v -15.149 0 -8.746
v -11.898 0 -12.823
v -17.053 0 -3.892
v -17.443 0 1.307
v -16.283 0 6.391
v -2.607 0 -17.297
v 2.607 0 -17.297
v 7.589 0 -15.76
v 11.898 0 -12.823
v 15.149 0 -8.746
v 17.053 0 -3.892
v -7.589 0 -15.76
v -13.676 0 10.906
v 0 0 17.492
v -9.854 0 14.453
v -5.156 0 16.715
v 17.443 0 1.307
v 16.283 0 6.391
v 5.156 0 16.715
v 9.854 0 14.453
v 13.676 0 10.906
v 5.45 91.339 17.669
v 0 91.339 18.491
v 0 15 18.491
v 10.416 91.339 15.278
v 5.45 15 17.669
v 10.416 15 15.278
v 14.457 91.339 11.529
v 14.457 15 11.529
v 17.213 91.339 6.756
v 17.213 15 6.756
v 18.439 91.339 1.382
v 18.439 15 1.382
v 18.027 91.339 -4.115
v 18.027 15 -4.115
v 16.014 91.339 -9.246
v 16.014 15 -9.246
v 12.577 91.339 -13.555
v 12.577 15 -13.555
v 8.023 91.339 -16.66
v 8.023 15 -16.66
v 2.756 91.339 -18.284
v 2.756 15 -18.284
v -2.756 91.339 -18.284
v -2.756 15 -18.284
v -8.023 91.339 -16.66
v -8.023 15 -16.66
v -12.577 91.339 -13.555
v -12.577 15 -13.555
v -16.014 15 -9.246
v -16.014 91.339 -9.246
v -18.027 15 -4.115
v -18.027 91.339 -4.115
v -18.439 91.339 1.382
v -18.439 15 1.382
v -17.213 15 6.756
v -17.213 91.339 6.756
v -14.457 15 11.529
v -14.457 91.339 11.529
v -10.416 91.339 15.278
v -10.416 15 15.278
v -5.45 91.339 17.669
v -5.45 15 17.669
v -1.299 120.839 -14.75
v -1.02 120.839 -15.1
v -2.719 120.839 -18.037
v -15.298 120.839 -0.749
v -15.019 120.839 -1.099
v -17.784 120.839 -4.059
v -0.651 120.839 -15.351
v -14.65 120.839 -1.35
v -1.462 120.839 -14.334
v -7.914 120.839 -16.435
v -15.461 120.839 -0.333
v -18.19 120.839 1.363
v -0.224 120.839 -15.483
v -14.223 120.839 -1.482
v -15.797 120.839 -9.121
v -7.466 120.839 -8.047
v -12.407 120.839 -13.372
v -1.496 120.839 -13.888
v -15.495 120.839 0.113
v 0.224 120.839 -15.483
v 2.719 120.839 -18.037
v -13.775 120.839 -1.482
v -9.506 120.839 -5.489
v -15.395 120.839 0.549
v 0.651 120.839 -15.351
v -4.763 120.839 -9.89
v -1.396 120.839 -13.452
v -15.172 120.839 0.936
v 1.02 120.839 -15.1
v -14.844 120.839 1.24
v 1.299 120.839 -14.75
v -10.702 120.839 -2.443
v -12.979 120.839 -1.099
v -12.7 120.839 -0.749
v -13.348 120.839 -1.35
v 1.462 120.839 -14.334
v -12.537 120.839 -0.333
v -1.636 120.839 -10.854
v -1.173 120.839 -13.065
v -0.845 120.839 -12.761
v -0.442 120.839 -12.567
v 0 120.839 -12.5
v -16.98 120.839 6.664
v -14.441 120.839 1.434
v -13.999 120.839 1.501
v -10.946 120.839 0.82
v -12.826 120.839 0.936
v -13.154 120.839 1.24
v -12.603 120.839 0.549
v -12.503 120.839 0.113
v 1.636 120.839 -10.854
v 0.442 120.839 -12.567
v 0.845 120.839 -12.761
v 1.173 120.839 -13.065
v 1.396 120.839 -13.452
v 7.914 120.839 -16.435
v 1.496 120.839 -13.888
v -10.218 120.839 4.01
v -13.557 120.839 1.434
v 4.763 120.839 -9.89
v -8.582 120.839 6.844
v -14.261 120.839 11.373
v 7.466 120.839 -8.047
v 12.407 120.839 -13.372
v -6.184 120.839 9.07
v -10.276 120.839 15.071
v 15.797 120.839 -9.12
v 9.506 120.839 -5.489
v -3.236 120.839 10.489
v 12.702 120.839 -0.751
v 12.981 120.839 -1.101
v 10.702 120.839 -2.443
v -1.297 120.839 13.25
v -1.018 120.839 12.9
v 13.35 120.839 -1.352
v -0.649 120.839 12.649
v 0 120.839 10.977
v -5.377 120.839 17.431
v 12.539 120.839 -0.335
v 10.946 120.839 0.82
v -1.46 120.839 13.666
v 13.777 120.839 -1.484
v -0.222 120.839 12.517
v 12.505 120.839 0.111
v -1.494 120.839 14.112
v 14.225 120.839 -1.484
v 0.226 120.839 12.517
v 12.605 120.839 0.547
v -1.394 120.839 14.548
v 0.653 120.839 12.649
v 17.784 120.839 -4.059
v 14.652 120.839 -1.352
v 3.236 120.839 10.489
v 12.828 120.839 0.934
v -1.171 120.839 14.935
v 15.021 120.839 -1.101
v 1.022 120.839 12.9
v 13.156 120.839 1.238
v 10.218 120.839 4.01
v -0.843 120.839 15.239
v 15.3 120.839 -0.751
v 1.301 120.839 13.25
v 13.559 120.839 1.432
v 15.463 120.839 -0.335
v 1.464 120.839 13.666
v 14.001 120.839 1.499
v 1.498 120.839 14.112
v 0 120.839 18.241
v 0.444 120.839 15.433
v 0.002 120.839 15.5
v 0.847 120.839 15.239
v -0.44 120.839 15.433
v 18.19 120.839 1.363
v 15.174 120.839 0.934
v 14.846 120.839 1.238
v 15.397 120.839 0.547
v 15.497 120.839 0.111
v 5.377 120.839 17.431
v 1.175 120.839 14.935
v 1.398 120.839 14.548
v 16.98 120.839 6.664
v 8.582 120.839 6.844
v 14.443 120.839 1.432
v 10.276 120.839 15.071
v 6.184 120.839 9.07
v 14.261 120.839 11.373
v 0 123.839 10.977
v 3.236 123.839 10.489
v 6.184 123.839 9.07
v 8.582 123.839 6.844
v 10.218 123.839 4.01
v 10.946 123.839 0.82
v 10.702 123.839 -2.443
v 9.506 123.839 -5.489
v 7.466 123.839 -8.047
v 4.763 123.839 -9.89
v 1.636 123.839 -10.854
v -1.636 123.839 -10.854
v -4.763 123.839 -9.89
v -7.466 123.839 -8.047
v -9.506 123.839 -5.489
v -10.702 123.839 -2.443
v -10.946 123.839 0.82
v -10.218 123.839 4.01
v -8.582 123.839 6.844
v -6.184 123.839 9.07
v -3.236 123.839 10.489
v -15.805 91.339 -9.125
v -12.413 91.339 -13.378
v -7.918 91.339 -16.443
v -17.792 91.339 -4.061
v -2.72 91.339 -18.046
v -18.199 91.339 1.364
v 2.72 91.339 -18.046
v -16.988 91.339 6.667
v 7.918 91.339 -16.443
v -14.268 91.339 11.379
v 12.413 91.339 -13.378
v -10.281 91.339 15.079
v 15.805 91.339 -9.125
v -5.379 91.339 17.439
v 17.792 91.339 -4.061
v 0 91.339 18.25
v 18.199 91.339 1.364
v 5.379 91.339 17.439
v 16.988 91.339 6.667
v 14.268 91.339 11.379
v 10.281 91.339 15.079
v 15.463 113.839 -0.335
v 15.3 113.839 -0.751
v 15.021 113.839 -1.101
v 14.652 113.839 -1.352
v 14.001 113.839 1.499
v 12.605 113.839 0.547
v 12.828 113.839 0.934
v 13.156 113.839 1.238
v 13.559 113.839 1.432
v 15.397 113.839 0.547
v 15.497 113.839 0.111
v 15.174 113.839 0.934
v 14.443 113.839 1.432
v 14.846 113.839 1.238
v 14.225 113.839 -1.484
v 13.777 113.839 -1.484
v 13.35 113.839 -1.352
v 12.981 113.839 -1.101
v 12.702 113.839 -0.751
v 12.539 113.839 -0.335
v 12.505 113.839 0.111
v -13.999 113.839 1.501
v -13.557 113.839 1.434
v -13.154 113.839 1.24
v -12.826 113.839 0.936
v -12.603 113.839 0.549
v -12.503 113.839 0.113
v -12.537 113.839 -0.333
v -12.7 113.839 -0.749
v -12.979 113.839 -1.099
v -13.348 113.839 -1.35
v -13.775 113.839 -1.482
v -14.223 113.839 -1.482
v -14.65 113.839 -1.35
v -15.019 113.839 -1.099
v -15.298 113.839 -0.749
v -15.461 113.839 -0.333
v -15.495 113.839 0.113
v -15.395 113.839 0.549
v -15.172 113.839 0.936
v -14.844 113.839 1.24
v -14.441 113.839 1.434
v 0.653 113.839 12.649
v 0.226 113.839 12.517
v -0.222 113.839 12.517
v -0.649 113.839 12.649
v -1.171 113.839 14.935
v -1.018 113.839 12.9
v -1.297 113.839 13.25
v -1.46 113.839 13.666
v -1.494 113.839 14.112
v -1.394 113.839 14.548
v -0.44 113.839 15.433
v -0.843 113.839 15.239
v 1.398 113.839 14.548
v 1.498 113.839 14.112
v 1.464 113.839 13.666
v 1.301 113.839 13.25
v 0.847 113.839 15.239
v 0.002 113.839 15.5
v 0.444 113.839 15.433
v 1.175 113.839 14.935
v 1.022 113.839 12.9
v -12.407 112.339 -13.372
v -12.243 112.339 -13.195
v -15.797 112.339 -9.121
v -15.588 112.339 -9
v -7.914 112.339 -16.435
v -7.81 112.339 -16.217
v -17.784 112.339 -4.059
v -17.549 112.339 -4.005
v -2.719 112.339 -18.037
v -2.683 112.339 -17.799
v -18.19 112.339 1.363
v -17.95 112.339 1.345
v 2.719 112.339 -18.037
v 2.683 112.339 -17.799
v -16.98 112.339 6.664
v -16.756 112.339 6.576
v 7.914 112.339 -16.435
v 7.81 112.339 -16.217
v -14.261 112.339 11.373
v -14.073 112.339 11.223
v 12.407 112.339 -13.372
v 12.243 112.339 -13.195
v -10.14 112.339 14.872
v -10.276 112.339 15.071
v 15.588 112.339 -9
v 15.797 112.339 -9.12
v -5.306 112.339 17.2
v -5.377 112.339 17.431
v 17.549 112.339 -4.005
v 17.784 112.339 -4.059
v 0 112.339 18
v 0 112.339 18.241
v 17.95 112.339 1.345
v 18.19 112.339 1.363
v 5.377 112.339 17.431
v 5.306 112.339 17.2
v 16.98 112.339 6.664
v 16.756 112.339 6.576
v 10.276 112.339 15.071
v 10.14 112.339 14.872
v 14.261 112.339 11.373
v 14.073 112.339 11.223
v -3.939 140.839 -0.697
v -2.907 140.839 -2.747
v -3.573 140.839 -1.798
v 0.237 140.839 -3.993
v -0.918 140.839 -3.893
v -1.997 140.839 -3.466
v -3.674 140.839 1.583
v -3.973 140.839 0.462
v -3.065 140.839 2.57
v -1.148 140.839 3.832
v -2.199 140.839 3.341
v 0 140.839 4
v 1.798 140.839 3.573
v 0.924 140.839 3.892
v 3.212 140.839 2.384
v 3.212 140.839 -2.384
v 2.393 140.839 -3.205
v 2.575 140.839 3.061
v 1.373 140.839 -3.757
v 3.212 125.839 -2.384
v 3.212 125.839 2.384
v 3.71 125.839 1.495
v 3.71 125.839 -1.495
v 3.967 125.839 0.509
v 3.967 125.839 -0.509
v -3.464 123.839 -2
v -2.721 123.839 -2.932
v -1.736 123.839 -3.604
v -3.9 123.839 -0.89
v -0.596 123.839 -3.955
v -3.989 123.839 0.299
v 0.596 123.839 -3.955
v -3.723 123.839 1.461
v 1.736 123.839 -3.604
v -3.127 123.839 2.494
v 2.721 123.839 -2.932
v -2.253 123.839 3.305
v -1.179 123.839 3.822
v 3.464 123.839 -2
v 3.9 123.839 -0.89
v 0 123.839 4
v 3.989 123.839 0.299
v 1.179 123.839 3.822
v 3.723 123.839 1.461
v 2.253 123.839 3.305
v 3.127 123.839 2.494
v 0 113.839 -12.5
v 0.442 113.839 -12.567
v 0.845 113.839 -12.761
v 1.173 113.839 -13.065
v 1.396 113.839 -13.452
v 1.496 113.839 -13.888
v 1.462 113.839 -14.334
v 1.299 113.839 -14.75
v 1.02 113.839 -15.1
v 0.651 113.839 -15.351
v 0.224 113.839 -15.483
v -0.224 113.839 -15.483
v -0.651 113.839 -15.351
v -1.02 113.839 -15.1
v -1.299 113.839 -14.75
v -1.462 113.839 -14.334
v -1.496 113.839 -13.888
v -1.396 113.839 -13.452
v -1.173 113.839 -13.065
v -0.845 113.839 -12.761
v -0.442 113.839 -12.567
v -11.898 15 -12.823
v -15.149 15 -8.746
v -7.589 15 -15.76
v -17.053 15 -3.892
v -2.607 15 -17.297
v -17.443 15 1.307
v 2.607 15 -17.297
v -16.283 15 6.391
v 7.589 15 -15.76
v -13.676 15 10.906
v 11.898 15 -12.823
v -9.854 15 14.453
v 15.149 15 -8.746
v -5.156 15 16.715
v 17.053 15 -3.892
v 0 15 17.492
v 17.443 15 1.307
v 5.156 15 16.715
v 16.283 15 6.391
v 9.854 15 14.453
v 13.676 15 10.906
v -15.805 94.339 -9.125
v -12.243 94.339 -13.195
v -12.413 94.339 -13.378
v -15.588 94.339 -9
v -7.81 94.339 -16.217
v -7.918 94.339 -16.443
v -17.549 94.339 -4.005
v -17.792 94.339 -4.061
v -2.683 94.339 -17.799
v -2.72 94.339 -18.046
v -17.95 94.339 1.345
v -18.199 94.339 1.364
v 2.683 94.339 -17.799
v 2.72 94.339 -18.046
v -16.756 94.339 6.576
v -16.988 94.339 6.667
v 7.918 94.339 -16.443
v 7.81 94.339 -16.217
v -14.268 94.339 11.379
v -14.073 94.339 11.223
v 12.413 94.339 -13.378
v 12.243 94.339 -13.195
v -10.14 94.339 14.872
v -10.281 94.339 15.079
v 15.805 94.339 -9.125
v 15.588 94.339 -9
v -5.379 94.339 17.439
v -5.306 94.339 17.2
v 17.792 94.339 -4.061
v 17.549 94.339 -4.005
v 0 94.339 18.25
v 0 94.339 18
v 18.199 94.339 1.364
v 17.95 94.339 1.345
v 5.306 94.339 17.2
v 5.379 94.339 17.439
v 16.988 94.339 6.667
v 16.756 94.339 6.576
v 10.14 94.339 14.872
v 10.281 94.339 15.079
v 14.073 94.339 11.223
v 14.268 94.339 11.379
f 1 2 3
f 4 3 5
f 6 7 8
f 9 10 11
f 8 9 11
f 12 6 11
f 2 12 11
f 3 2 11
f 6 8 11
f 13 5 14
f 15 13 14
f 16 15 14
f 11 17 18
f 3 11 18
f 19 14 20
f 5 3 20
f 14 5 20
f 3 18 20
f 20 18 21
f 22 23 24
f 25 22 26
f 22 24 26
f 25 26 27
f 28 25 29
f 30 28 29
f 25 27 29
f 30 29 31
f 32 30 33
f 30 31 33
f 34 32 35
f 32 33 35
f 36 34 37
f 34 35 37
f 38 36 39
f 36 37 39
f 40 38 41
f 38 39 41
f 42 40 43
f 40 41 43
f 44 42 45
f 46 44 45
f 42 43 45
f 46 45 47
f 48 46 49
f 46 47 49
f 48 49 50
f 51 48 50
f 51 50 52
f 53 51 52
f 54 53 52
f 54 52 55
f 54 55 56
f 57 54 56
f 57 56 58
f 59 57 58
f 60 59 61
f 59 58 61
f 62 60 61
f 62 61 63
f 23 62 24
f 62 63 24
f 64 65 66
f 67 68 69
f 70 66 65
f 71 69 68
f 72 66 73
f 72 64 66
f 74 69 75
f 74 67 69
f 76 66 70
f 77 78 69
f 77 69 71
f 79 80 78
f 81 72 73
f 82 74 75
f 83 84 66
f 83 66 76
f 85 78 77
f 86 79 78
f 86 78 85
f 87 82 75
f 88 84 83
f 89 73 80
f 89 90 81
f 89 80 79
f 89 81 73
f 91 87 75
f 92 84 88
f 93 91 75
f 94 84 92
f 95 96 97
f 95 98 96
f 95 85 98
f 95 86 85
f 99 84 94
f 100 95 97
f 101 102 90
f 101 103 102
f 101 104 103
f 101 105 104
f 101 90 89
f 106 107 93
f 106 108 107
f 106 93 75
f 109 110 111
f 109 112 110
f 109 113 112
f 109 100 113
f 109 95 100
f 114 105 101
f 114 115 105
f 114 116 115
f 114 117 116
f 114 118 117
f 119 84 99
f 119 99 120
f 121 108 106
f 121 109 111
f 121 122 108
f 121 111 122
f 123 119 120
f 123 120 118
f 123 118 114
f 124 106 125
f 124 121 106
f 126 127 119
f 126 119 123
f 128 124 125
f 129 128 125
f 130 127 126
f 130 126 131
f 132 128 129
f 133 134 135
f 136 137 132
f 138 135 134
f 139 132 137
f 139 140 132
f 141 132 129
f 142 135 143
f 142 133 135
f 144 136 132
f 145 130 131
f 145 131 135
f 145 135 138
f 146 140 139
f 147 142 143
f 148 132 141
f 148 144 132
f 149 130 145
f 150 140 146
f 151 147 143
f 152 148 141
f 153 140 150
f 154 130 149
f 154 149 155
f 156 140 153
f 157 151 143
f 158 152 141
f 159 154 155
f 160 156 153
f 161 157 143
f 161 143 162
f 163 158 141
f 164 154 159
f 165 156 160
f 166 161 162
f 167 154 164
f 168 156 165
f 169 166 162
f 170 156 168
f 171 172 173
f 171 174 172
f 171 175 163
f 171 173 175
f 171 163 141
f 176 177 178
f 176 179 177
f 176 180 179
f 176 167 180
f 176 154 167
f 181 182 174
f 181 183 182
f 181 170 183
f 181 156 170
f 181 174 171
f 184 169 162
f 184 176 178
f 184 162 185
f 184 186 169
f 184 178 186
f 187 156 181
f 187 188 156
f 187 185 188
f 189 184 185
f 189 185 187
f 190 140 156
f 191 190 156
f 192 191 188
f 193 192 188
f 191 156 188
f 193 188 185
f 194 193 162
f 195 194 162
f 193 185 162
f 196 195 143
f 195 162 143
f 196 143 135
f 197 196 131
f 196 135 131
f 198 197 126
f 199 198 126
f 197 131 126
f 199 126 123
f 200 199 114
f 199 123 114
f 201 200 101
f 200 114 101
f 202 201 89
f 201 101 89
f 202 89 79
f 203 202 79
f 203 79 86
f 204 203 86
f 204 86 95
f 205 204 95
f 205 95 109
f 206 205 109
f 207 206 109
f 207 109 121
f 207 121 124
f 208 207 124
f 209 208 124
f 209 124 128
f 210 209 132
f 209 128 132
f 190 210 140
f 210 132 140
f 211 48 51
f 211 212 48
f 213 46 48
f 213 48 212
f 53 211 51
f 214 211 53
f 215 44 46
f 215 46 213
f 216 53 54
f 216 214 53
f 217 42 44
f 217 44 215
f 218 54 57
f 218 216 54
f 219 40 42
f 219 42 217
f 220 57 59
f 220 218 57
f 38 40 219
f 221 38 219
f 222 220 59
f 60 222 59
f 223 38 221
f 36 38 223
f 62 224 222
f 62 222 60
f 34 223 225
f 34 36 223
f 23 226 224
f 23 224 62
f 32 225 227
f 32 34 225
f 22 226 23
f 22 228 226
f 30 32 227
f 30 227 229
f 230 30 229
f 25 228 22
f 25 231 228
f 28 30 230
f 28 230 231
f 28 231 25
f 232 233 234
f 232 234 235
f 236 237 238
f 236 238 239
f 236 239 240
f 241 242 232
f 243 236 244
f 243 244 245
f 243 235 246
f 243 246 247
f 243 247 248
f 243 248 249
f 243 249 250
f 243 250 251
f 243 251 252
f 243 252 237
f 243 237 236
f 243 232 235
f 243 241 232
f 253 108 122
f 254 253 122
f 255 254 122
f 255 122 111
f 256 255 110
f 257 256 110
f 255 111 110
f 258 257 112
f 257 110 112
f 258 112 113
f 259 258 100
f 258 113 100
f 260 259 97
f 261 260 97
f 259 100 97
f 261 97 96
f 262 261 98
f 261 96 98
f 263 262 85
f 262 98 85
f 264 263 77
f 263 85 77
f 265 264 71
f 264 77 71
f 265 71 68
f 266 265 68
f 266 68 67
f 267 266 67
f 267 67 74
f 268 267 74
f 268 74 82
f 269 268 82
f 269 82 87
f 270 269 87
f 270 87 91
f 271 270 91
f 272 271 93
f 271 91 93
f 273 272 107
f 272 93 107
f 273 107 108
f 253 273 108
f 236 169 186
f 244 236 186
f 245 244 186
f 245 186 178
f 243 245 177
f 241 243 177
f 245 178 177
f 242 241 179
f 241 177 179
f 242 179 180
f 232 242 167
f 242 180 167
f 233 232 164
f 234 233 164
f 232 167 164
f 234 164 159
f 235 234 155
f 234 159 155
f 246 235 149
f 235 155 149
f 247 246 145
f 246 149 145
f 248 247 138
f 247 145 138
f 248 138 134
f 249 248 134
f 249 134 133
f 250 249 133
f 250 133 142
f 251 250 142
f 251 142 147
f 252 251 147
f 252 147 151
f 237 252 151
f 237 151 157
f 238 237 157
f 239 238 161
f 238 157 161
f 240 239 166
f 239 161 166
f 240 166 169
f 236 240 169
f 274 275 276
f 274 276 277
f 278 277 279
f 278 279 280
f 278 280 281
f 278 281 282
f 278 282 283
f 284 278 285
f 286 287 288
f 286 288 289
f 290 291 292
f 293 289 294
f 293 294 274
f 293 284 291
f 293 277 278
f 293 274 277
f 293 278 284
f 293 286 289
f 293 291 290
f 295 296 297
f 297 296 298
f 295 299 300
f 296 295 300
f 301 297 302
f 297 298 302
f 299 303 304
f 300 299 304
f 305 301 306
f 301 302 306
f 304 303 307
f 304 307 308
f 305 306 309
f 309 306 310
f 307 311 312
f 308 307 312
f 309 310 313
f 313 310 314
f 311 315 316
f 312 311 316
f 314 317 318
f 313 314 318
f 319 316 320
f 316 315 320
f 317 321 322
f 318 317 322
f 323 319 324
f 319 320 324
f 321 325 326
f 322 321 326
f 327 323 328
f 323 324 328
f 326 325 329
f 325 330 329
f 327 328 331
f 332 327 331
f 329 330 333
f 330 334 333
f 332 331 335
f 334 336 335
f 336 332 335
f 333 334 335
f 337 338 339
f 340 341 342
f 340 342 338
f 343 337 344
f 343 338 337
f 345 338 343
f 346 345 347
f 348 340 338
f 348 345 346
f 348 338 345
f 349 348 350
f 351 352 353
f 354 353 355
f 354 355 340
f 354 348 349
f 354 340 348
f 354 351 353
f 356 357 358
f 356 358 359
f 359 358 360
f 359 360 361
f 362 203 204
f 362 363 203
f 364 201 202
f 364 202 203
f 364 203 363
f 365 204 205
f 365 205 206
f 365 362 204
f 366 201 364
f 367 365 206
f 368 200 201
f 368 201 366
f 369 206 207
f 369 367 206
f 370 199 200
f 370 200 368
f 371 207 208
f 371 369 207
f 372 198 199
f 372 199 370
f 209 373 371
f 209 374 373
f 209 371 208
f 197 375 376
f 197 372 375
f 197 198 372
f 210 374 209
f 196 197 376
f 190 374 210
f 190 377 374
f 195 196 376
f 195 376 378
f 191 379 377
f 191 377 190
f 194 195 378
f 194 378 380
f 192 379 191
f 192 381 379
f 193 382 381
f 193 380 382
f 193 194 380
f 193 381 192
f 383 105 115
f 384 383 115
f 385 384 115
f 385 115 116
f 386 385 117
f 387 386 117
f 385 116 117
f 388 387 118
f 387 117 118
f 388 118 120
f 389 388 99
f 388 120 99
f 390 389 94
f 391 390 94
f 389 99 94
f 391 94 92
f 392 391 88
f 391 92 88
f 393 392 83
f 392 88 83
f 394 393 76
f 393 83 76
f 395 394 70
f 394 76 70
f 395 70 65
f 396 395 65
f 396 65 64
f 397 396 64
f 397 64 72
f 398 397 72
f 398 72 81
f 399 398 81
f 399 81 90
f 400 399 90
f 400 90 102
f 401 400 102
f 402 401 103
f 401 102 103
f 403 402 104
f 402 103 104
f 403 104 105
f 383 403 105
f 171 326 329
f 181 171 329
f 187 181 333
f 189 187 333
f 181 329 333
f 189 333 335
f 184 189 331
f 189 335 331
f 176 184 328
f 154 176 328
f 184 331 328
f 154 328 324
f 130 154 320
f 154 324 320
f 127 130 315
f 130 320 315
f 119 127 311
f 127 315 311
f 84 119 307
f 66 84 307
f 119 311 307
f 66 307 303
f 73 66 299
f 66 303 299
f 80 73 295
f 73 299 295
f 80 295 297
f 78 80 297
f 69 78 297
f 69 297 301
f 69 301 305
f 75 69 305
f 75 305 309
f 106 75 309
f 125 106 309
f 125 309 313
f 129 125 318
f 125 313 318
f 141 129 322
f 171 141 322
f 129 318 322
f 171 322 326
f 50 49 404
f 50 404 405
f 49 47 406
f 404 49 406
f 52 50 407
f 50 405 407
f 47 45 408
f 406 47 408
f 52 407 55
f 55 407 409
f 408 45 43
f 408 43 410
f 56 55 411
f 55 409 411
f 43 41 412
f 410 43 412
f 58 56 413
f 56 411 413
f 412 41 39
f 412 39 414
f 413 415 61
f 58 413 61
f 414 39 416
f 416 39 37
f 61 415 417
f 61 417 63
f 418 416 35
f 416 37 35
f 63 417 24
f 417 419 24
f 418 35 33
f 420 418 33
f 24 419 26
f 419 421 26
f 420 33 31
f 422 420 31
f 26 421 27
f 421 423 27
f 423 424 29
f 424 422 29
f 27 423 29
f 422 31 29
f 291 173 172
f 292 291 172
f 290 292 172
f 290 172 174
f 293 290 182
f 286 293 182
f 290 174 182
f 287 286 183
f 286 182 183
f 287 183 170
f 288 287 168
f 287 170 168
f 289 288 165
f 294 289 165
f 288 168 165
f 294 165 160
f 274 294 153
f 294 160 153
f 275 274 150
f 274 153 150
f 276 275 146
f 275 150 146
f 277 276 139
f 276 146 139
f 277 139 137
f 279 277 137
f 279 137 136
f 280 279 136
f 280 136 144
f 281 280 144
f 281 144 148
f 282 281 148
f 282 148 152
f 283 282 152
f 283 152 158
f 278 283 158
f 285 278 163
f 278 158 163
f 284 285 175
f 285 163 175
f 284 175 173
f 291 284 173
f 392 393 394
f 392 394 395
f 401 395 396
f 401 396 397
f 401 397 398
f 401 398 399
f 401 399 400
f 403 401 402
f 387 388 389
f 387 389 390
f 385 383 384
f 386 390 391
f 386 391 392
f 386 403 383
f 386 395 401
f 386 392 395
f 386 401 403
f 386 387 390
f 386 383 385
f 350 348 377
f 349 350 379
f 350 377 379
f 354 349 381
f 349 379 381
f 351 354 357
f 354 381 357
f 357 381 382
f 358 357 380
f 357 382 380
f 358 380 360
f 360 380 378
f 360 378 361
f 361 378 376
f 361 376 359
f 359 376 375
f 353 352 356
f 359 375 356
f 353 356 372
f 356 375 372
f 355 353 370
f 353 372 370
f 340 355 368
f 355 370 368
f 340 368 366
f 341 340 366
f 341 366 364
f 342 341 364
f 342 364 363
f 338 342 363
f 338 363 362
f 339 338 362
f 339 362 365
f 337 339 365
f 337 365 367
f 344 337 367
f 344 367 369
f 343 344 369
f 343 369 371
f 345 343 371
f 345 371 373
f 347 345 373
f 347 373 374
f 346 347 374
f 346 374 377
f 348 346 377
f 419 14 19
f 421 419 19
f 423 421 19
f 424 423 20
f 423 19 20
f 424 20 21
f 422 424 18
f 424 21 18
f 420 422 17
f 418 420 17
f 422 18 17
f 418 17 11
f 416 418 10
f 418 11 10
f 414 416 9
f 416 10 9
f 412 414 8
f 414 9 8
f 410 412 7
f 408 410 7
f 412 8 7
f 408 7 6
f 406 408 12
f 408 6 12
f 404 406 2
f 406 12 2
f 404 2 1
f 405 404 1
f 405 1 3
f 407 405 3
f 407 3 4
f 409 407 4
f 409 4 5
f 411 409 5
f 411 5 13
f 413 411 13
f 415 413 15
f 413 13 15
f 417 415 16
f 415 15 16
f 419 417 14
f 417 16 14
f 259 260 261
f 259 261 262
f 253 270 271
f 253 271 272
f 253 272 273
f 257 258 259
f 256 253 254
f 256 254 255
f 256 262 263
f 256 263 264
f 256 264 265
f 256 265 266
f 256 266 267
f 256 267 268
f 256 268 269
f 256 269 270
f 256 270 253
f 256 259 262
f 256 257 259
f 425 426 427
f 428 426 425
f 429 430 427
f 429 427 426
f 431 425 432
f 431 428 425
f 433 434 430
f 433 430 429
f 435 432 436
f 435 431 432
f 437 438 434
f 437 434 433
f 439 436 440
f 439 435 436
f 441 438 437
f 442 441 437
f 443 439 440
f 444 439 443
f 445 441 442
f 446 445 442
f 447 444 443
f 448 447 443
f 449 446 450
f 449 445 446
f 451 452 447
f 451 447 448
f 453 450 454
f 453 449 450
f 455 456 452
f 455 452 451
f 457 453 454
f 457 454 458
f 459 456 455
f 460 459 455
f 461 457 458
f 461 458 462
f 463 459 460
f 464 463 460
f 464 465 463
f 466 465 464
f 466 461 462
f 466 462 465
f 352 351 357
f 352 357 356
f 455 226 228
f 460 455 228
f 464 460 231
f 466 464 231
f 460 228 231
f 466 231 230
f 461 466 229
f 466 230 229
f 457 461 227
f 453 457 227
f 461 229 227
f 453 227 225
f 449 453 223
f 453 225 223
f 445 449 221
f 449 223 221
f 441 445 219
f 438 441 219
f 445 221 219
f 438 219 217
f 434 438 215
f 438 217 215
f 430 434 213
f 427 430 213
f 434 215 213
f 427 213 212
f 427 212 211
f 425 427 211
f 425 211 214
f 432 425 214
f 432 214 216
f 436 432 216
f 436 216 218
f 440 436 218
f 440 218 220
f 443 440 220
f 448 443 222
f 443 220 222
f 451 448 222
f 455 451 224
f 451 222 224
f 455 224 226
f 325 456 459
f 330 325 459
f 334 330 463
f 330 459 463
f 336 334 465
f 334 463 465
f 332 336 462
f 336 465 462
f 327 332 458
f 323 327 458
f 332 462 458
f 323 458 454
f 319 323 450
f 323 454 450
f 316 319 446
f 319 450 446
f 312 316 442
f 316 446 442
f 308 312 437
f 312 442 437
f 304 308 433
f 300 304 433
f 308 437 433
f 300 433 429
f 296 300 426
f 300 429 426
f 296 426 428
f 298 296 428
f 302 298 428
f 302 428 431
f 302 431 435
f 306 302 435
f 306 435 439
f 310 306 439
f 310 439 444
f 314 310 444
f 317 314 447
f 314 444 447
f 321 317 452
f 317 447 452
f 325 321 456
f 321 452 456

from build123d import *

# Parameters (mm, degrees)
ESQUISSE1_R      = 17.492
EXTRUSION1_DEPTH = 15
ESQUISSE2_R      = 18.491
EXTRUSION2_DEPTH = 76.339
ESQUISSE3_R      = 18.25
EXTRUSION3_DEPTH = 3
ESQUISSE4_R      = 18
EXTRUSION4_DEPTH = 18
ESQUISSE5_R      = 18.241
EXTRUSION5_DEPTH = 8.5
ESQUISSE6_R      = 10.977
EXTRUSION6_DEPTH = 3
ESQUISSE7_R      = 4
EXTRUSION7_DEPTH = 17
ESQUISSE8_W      = 2.691612919
ESQUISSE8_H      = 12.532822653
EXTRUSION8_DEPTH = 15
ESQUISSE9_R      = 1.5
EXTRUSION9_DEPTH = 7


with BuildPart() as part:
    # Esquisse1 → Extrusion1 (new body)
    with BuildSketch(Plane(origin=(0, 0, 0), x_dir=(1, 0, 0), z_dir=(0, 1, 0))):
        with Locations(Location((0, 0, 0), (0, 0, 270))):
            Circle(ESQUISSE1_R)
    extrude(amount=EXTRUSION1_DEPTH)

    # Esquisse2 → Extrusion2 (add)
    with BuildSketch(Plane(origin=(0, 15, 0), x_dir=(1, 0, 0), z_dir=(0, 1, 0))):
        with Locations(Location((0, 0, 0), (0, 0, 270))):
            Circle(ESQUISSE2_R)
    extrude(amount=EXTRUSION2_DEPTH)

    # Esquisse3 → Extrusion3 (add)
    with BuildSketch(Plane(origin=(0, 91.339, 0), x_dir=(1, 0, 0), z_dir=(0, 1, 0))):
        with Locations(Location((0, 0, 0), (0, 0, 270))):
            Circle(ESQUISSE3_R)
    extrude(amount=EXTRUSION3_DEPTH)

    # Esquisse4 → Extrusion4 (add)
    with BuildSketch(Plane(origin=(0, 94.339, 0), x_dir=(1, 0, 0), z_dir=(0, 1, 0))):
        with Locations(Location((0, 0, 0), (0, 0, 270))):
            Circle(ESQUISSE4_R)
    extrude(amount=EXTRUSION4_DEPTH)

    # Esquisse5 → Extrusion5 (add)
    with BuildSketch(Plane(origin=(0, 112.339, 0), x_dir=(1, 0, 0), z_dir=(0, 1, 0))):
        with Locations(Location((0, 0, 0), (0, 0, 270))):
            Circle(ESQUISSE5_R)
    extrude(amount=EXTRUSION5_DEPTH)

    # Esquisse6 → Extrusion6 (add)
    with BuildSketch(Plane(origin=(0, 120.839, 0), x_dir=(1, 0, 0), z_dir=(0, 1, 0))):
        with Locations(Location((0, 0, 0), (0, 0, 270))):
            Circle(ESQUISSE6_R)
    extrude(amount=EXTRUSION6_DEPTH)

    # Esquisse7 → Extrusion7 (add)
    with BuildSketch(Plane(origin=(0, 123.839, 0), x_dir=(-1, 0, 0), z_dir=(0, 1, 0))):
        with Locations(Location((0, 0, 0), (0, 0, 90))):
            Circle(ESQUISSE7_R)
    extrude(amount=EXTRUSION7_DEPTH)

    # Esquisse8 → Extrusion8 (cut)
    with BuildSketch(Plane(origin=(0, 140.839, 0), x_dir=(1, 0, 0), z_dir=(0, 1, 0))):
        with Locations((4.55780646, -1.030383071)):
            Rectangle(ESQUISSE8_W, ESQUISSE8_H)
    extrude(amount=-EXTRUSION8_DEPTH, mode=Mode.SUBTRACT)

    # Esquisse9 → Extrusion9 (cut)
    with BuildSketch(Plane(origin=(0, 120.839, 0), x_dir=(1, 0, 0), z_dir=(0, 1, 0))):
        with Locations(Location((0, 14, 0), (0, 0, 270))):
            Circle(ESQUISSE9_R)
        with Locations(Location((14.001, 0.001, 0), (0, 0, 270))):
            Circle(ESQUISSE9_R)
        with Locations(Location((0.002, -14, 0), (0, 0, 270))):
            Circle(ESQUISSE9_R)
        with Locations(Location((-13.999, -0.001, 0), (0, 0, 270))):
            Circle(ESQUISSE9_R)
    extrude(amount=-EXTRUSION9_DEPTH, mode=Mode.SUBTRACT)


solid = part.part
